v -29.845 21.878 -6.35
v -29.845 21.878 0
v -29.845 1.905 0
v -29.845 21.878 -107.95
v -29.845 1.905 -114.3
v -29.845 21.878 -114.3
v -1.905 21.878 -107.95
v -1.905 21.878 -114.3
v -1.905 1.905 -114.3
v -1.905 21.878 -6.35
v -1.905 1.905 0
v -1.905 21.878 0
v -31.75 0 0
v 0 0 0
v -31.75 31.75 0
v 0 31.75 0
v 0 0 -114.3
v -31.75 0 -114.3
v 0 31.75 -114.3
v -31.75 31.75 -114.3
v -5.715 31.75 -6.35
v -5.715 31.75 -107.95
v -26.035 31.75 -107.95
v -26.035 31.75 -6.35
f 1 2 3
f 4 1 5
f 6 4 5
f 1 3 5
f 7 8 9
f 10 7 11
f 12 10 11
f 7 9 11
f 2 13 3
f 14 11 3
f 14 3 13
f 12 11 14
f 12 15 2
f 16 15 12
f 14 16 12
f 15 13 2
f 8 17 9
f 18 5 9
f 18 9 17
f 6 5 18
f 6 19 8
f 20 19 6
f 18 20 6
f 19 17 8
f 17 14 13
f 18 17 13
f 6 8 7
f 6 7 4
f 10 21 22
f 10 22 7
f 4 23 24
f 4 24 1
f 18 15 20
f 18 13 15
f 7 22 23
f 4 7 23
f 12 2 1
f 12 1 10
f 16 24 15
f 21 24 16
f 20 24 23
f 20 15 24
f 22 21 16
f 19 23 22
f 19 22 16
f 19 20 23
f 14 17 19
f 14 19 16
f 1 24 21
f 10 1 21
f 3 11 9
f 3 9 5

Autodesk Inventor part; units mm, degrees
ref_plane "YZ Plane" through (0, 0, 0) normal (1, 0, 0) x (0, 1, 0)
ref_plane "XZ Plane" through (0, 0, 0) normal (0, 1, 0) x (-1, 0, 0)
ref_plane "XY Plane" through (0, 0, 0) normal (0, 0, 1) x (1, 0, 0)
sketch "Sketch1" plane through (0, 0, 0) normal (0, 1, 0) x (-1, 0, 0)
  line L0 (0, 0) -> (31.75, 0)
  line L1 (31.75, 0) -> (31.75, -114.3)
  line L2 (31.75, -114.3) -> (0, -114.3)
  line L3 (0, -114.3) -> (0, 0)
  dimension "d0" = 31.75
  dimension "d1" = 114.3
extrude "Extrusion1" add sketch "Sketch1" along normal blind 31.75
shell "Shell1" thickness 1.905 removed faces 3 at (-10.5833, 10.5833, 0) at (-21.1667, 21.1667, -114.3) at (-10.5833, 31.75, -38.1)
sketch "Sketch2" plane through (-31.75, 0, 0) normal (0, 0, 1) x (1, 0, 0)
  line L0 (1.905, 1.905) -> (1.905, 31.75) projected
  line L1 (29.845, 31.75) -> (29.845, 1.905) projected
  line L2 (1.905, 31.75) -> (5.715, 31.75)
  line L3 (5.715, 31.75) -> (1.905, 21.8784)
  line L4 (1.905, 31.75) -> (1.905, 1.905) projected
  line L5 (29.845, 31.75) -> (26.035, 31.75)
  line L6 (26.035, 31.75) -> (29.845, 21.8784)
  point P0 (31.75, 0)
  dimension "d5" = 3.81
extrude "Extrusion2" add sketch "Sketch2" against normal up to surface (114.3 mm away)
sketch "Sketch4" plane through (-31.75, 0, 0) normal (0, 0, 1) x (1, 0, 0)
  line L0 (1.905, 21.8784) -> (5.715, 31.75) projected
  line L1 (29.845, 21.8784) -> (26.035, 31.75) projected
  line L2 (5.715, 31.75) -> (26.035, 31.75)
  line L3 (1.905, 21.8784) -> (29.845, 21.8784)
  point P0 (31.75, 0)
extrude "Extrusion3" add sketch "Sketch4" against normal blind 6.35
sketch "Sketch5" plane through (0, 0, -114.3) normal (0, 0, -1) x (-1, 0, 0)
  line L0 (26.035, 31.75) -> (29.845, 21.8784) projected
  line L1 (26.035, 31.75) -> (5.715, 31.75) projected
  line L2 (1.905, 21.8784) -> (5.715, 31.75) projected
  line L3 (1.905, 21.8784) -> (29.845, 21.8784) projected
  point P0 (0, 0)
extrude "Extrusion4" add sketch "Sketch5" against normal blind 6.35
properties part number "MidshipsUnibody"
